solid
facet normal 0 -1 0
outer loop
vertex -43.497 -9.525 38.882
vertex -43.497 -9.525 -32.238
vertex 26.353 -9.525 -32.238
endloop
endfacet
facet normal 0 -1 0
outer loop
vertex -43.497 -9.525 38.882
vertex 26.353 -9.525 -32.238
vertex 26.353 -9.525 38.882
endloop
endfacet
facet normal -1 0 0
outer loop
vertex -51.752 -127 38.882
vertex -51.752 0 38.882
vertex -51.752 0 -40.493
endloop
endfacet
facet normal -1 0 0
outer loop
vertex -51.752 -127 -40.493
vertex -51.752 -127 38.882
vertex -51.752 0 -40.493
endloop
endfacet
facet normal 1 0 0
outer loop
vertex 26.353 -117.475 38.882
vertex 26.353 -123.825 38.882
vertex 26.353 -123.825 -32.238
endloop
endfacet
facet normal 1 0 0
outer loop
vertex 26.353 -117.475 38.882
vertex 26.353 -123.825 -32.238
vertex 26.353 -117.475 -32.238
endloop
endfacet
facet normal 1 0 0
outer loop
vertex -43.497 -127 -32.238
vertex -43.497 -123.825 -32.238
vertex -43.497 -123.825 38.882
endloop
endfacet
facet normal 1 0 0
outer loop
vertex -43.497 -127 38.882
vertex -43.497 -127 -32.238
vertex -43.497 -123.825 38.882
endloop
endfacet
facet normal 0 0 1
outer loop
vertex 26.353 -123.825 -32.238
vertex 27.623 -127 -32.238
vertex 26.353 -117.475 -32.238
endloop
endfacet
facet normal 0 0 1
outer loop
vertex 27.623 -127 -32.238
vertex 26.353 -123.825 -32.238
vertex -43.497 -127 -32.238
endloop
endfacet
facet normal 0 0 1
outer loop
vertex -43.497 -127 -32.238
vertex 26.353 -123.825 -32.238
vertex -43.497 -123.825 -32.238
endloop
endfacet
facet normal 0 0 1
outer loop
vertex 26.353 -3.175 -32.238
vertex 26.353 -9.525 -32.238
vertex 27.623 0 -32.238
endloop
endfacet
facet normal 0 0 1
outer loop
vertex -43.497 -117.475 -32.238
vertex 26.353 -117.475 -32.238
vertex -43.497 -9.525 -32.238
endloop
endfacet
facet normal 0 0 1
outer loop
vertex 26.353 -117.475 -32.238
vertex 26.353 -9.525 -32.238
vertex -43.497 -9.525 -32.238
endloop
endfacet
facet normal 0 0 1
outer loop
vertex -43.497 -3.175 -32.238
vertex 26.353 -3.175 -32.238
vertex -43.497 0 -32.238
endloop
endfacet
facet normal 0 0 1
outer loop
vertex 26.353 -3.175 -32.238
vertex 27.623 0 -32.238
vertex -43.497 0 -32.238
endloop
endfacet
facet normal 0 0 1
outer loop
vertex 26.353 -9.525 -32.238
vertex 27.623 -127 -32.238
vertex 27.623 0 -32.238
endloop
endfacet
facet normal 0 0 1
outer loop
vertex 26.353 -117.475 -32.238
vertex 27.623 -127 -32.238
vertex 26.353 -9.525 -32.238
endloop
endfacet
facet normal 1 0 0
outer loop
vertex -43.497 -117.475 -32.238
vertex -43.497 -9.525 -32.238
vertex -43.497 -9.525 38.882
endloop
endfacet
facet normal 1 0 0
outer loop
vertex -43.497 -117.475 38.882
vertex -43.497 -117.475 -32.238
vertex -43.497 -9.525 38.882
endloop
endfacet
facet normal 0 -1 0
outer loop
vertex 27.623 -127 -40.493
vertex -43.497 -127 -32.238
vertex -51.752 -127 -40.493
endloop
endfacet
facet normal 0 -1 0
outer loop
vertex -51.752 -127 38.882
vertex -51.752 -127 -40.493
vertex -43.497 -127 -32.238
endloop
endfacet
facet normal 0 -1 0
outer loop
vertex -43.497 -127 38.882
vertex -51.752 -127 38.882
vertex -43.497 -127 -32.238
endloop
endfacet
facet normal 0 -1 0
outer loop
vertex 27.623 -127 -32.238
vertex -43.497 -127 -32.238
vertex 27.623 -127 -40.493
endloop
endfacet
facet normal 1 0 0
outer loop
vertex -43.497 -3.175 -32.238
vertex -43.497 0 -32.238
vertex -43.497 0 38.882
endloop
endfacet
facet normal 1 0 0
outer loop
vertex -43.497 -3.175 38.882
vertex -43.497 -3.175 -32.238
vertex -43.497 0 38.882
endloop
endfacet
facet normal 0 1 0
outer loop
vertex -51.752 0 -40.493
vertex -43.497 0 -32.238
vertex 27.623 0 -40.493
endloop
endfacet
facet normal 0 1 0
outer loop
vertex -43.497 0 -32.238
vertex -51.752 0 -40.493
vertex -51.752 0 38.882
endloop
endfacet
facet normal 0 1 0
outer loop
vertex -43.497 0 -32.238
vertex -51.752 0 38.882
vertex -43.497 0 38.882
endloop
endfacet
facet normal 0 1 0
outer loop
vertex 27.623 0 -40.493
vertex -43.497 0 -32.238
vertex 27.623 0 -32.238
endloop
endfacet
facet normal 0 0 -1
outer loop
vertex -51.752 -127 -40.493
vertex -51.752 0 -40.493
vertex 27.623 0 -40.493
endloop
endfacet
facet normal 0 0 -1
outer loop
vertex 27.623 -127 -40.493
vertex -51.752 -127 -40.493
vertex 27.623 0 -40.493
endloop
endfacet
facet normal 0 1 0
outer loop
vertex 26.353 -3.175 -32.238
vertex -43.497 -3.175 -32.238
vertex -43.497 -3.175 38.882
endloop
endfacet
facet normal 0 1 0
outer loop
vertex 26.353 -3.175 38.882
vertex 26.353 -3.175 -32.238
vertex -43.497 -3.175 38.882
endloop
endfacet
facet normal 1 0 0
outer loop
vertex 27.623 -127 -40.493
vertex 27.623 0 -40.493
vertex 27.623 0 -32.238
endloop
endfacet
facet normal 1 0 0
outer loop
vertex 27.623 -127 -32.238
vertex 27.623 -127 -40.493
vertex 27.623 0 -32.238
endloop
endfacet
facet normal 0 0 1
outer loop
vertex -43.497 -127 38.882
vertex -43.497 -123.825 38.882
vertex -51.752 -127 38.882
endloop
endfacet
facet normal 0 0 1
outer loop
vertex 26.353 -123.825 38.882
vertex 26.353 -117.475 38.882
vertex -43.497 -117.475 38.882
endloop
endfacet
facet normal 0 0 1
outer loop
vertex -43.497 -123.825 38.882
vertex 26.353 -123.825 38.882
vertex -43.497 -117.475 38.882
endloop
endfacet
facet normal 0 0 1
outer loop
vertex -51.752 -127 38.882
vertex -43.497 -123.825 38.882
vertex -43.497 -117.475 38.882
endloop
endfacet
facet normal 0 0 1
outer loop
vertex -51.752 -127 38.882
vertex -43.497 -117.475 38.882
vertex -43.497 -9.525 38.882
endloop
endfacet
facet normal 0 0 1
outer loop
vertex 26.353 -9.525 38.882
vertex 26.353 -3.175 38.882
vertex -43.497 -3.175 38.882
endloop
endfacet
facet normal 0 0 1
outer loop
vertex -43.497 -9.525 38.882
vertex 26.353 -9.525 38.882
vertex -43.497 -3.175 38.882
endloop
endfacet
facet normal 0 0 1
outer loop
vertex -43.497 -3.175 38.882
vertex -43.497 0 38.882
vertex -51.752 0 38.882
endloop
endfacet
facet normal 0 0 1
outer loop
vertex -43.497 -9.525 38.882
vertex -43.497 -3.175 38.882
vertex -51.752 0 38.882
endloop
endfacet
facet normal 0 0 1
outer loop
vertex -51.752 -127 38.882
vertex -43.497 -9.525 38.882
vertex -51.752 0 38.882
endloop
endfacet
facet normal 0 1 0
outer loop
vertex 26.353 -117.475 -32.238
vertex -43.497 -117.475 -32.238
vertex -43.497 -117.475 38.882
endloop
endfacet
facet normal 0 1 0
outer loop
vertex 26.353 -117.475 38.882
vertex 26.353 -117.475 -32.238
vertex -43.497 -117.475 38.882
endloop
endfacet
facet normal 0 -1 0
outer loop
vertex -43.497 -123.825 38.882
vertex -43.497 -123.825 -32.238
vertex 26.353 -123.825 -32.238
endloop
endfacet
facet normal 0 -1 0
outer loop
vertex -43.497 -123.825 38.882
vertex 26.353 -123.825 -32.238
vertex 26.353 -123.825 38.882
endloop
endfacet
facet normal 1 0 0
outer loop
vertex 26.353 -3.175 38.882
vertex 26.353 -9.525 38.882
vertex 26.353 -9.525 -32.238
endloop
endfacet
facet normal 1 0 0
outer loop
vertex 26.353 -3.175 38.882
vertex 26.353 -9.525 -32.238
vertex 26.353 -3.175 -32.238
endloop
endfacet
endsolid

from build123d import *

# Parameters (mm, degrees)
F1_DEPTH = 127
F2_W     = 6.35
F2_H     = 71.12
F3_DEPTH = 69.85


with BuildPart() as f1:
    # F0 (on Front) → F1 (new body)
    with BuildSketch(Plane.XZ):
        Polygon((-43.496815, 38.881797), (-51.751815, 38.881797), (-51.751815, -40.493203), (27.623185, -40.493203), (27.623185, -32.238203), (-43.496815, -32.238203), align=None)
    extrude(amount=F1_DEPTH)

    # F2 (on face) → F3 (join)
    with BuildSketch(Plane.YZ.offset(-43.496815)):
        with Locations((-120.65, 3.321797)):
            Rectangle(F2_W, F2_H)
        with Locations((-6.35, 3.321797)):
            Rectangle(F2_W, F2_H)
    extrude(amount=F3_DEPTH)


solid = f1.part
